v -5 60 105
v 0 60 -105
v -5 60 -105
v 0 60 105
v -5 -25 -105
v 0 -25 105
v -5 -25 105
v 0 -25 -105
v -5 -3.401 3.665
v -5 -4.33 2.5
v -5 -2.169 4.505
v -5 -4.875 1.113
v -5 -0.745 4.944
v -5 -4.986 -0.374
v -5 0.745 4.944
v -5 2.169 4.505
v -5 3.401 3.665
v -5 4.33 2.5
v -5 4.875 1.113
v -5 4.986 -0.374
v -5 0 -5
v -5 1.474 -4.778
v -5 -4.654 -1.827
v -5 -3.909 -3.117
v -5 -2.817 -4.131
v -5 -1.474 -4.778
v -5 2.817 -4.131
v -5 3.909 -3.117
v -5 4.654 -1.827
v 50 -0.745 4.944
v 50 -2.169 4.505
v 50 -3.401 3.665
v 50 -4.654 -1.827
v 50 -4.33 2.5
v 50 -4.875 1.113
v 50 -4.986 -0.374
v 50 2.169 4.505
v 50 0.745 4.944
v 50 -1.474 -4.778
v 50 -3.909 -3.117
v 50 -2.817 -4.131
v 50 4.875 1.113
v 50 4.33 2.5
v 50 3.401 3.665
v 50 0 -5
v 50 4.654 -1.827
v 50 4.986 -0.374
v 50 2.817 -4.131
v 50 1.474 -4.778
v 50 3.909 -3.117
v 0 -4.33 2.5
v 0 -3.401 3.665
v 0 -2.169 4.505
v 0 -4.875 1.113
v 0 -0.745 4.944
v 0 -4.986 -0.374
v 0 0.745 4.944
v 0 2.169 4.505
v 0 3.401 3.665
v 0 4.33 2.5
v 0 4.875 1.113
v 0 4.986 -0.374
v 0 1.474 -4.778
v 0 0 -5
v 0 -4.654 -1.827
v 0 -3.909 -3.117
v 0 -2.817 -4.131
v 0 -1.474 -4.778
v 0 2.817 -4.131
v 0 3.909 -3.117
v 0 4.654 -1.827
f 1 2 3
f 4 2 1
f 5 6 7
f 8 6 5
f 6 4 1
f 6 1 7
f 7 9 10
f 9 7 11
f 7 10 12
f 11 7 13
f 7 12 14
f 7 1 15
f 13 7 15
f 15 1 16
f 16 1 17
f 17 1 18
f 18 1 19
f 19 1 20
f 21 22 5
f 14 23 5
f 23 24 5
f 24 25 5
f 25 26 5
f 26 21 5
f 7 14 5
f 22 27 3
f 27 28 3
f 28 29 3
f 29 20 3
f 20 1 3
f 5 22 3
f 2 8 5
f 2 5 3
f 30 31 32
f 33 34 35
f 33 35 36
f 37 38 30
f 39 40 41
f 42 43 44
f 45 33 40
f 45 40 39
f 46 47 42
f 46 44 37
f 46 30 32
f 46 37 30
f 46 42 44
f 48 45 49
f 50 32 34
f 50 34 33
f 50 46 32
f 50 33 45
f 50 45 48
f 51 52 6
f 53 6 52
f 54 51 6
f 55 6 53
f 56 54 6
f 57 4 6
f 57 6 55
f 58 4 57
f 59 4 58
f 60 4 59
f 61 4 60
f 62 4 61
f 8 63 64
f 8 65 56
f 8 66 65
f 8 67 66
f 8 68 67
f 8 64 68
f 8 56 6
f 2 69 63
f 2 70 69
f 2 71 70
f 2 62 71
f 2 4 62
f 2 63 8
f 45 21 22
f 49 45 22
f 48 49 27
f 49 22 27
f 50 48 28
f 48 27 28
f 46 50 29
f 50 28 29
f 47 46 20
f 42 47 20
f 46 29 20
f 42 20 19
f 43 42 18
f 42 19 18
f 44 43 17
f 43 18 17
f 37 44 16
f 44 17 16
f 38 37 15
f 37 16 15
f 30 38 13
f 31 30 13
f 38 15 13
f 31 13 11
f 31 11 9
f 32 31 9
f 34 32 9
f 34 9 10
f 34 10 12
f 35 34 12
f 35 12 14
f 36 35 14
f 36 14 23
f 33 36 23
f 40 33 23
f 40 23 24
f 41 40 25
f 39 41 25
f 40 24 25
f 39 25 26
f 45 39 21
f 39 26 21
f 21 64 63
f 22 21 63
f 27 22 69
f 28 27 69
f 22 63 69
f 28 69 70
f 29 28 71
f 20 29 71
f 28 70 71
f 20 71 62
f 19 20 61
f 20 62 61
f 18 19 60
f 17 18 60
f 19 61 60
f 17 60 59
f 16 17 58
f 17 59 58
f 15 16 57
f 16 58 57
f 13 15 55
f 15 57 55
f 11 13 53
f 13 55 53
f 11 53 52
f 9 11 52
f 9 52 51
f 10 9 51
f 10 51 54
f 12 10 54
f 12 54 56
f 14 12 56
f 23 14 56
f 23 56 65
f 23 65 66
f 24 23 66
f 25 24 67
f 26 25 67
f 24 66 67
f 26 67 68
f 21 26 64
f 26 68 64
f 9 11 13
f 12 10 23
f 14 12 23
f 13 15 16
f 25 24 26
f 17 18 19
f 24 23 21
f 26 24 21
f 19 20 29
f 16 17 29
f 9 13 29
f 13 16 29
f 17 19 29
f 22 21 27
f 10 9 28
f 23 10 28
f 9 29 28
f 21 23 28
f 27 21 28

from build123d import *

# Parameters (mm, degrees)
BOSS_EXTRUDE1_DEPTH      = 50
BOSS_EXTRUDE1_DEPTH_BACK = 5
SKETCH1_R                = 5
SKETCH1_3_R              = 5
BOSS_EXTRUDE2_DEPTH      = 5


with BuildPart() as part:
    # Sketch1 → Boss-Extrude1 (new, two sides: drawn at the far end of the back side and taken through both)
    with BuildSketch(Plane(origin=(0, 0, 0), x_dir=(0, 0, -1), z_dir=(1, 0, 0)).offset(-BOSS_EXTRUDE1_DEPTH_BACK)):
        Circle(SKETCH1_R)
    extrude(amount=BOSS_EXTRUDE1_DEPTH + BOSS_EXTRUDE1_DEPTH_BACK)


with BuildPart() as body_2:
    # Sketch1<3> → Boss-Extrude2 (new body)
    with BuildSketch(Plane(origin=(0, 0, 0), x_dir=(0, 0, -1), z_dir=(1, 0, 0))):
        Polygon((0, -25), (105, -25), (105, 0), (105, 60), (0, 60), (-105, 60), (-105, 0), (-105, -25), align=None)
        Circle(SKETCH1_3_R, mode=Mode.SUBTRACT)
    extrude(amount=-BOSS_EXTRUDE2_DEPTH)


solid = Compound([part.part, body_2.part])
